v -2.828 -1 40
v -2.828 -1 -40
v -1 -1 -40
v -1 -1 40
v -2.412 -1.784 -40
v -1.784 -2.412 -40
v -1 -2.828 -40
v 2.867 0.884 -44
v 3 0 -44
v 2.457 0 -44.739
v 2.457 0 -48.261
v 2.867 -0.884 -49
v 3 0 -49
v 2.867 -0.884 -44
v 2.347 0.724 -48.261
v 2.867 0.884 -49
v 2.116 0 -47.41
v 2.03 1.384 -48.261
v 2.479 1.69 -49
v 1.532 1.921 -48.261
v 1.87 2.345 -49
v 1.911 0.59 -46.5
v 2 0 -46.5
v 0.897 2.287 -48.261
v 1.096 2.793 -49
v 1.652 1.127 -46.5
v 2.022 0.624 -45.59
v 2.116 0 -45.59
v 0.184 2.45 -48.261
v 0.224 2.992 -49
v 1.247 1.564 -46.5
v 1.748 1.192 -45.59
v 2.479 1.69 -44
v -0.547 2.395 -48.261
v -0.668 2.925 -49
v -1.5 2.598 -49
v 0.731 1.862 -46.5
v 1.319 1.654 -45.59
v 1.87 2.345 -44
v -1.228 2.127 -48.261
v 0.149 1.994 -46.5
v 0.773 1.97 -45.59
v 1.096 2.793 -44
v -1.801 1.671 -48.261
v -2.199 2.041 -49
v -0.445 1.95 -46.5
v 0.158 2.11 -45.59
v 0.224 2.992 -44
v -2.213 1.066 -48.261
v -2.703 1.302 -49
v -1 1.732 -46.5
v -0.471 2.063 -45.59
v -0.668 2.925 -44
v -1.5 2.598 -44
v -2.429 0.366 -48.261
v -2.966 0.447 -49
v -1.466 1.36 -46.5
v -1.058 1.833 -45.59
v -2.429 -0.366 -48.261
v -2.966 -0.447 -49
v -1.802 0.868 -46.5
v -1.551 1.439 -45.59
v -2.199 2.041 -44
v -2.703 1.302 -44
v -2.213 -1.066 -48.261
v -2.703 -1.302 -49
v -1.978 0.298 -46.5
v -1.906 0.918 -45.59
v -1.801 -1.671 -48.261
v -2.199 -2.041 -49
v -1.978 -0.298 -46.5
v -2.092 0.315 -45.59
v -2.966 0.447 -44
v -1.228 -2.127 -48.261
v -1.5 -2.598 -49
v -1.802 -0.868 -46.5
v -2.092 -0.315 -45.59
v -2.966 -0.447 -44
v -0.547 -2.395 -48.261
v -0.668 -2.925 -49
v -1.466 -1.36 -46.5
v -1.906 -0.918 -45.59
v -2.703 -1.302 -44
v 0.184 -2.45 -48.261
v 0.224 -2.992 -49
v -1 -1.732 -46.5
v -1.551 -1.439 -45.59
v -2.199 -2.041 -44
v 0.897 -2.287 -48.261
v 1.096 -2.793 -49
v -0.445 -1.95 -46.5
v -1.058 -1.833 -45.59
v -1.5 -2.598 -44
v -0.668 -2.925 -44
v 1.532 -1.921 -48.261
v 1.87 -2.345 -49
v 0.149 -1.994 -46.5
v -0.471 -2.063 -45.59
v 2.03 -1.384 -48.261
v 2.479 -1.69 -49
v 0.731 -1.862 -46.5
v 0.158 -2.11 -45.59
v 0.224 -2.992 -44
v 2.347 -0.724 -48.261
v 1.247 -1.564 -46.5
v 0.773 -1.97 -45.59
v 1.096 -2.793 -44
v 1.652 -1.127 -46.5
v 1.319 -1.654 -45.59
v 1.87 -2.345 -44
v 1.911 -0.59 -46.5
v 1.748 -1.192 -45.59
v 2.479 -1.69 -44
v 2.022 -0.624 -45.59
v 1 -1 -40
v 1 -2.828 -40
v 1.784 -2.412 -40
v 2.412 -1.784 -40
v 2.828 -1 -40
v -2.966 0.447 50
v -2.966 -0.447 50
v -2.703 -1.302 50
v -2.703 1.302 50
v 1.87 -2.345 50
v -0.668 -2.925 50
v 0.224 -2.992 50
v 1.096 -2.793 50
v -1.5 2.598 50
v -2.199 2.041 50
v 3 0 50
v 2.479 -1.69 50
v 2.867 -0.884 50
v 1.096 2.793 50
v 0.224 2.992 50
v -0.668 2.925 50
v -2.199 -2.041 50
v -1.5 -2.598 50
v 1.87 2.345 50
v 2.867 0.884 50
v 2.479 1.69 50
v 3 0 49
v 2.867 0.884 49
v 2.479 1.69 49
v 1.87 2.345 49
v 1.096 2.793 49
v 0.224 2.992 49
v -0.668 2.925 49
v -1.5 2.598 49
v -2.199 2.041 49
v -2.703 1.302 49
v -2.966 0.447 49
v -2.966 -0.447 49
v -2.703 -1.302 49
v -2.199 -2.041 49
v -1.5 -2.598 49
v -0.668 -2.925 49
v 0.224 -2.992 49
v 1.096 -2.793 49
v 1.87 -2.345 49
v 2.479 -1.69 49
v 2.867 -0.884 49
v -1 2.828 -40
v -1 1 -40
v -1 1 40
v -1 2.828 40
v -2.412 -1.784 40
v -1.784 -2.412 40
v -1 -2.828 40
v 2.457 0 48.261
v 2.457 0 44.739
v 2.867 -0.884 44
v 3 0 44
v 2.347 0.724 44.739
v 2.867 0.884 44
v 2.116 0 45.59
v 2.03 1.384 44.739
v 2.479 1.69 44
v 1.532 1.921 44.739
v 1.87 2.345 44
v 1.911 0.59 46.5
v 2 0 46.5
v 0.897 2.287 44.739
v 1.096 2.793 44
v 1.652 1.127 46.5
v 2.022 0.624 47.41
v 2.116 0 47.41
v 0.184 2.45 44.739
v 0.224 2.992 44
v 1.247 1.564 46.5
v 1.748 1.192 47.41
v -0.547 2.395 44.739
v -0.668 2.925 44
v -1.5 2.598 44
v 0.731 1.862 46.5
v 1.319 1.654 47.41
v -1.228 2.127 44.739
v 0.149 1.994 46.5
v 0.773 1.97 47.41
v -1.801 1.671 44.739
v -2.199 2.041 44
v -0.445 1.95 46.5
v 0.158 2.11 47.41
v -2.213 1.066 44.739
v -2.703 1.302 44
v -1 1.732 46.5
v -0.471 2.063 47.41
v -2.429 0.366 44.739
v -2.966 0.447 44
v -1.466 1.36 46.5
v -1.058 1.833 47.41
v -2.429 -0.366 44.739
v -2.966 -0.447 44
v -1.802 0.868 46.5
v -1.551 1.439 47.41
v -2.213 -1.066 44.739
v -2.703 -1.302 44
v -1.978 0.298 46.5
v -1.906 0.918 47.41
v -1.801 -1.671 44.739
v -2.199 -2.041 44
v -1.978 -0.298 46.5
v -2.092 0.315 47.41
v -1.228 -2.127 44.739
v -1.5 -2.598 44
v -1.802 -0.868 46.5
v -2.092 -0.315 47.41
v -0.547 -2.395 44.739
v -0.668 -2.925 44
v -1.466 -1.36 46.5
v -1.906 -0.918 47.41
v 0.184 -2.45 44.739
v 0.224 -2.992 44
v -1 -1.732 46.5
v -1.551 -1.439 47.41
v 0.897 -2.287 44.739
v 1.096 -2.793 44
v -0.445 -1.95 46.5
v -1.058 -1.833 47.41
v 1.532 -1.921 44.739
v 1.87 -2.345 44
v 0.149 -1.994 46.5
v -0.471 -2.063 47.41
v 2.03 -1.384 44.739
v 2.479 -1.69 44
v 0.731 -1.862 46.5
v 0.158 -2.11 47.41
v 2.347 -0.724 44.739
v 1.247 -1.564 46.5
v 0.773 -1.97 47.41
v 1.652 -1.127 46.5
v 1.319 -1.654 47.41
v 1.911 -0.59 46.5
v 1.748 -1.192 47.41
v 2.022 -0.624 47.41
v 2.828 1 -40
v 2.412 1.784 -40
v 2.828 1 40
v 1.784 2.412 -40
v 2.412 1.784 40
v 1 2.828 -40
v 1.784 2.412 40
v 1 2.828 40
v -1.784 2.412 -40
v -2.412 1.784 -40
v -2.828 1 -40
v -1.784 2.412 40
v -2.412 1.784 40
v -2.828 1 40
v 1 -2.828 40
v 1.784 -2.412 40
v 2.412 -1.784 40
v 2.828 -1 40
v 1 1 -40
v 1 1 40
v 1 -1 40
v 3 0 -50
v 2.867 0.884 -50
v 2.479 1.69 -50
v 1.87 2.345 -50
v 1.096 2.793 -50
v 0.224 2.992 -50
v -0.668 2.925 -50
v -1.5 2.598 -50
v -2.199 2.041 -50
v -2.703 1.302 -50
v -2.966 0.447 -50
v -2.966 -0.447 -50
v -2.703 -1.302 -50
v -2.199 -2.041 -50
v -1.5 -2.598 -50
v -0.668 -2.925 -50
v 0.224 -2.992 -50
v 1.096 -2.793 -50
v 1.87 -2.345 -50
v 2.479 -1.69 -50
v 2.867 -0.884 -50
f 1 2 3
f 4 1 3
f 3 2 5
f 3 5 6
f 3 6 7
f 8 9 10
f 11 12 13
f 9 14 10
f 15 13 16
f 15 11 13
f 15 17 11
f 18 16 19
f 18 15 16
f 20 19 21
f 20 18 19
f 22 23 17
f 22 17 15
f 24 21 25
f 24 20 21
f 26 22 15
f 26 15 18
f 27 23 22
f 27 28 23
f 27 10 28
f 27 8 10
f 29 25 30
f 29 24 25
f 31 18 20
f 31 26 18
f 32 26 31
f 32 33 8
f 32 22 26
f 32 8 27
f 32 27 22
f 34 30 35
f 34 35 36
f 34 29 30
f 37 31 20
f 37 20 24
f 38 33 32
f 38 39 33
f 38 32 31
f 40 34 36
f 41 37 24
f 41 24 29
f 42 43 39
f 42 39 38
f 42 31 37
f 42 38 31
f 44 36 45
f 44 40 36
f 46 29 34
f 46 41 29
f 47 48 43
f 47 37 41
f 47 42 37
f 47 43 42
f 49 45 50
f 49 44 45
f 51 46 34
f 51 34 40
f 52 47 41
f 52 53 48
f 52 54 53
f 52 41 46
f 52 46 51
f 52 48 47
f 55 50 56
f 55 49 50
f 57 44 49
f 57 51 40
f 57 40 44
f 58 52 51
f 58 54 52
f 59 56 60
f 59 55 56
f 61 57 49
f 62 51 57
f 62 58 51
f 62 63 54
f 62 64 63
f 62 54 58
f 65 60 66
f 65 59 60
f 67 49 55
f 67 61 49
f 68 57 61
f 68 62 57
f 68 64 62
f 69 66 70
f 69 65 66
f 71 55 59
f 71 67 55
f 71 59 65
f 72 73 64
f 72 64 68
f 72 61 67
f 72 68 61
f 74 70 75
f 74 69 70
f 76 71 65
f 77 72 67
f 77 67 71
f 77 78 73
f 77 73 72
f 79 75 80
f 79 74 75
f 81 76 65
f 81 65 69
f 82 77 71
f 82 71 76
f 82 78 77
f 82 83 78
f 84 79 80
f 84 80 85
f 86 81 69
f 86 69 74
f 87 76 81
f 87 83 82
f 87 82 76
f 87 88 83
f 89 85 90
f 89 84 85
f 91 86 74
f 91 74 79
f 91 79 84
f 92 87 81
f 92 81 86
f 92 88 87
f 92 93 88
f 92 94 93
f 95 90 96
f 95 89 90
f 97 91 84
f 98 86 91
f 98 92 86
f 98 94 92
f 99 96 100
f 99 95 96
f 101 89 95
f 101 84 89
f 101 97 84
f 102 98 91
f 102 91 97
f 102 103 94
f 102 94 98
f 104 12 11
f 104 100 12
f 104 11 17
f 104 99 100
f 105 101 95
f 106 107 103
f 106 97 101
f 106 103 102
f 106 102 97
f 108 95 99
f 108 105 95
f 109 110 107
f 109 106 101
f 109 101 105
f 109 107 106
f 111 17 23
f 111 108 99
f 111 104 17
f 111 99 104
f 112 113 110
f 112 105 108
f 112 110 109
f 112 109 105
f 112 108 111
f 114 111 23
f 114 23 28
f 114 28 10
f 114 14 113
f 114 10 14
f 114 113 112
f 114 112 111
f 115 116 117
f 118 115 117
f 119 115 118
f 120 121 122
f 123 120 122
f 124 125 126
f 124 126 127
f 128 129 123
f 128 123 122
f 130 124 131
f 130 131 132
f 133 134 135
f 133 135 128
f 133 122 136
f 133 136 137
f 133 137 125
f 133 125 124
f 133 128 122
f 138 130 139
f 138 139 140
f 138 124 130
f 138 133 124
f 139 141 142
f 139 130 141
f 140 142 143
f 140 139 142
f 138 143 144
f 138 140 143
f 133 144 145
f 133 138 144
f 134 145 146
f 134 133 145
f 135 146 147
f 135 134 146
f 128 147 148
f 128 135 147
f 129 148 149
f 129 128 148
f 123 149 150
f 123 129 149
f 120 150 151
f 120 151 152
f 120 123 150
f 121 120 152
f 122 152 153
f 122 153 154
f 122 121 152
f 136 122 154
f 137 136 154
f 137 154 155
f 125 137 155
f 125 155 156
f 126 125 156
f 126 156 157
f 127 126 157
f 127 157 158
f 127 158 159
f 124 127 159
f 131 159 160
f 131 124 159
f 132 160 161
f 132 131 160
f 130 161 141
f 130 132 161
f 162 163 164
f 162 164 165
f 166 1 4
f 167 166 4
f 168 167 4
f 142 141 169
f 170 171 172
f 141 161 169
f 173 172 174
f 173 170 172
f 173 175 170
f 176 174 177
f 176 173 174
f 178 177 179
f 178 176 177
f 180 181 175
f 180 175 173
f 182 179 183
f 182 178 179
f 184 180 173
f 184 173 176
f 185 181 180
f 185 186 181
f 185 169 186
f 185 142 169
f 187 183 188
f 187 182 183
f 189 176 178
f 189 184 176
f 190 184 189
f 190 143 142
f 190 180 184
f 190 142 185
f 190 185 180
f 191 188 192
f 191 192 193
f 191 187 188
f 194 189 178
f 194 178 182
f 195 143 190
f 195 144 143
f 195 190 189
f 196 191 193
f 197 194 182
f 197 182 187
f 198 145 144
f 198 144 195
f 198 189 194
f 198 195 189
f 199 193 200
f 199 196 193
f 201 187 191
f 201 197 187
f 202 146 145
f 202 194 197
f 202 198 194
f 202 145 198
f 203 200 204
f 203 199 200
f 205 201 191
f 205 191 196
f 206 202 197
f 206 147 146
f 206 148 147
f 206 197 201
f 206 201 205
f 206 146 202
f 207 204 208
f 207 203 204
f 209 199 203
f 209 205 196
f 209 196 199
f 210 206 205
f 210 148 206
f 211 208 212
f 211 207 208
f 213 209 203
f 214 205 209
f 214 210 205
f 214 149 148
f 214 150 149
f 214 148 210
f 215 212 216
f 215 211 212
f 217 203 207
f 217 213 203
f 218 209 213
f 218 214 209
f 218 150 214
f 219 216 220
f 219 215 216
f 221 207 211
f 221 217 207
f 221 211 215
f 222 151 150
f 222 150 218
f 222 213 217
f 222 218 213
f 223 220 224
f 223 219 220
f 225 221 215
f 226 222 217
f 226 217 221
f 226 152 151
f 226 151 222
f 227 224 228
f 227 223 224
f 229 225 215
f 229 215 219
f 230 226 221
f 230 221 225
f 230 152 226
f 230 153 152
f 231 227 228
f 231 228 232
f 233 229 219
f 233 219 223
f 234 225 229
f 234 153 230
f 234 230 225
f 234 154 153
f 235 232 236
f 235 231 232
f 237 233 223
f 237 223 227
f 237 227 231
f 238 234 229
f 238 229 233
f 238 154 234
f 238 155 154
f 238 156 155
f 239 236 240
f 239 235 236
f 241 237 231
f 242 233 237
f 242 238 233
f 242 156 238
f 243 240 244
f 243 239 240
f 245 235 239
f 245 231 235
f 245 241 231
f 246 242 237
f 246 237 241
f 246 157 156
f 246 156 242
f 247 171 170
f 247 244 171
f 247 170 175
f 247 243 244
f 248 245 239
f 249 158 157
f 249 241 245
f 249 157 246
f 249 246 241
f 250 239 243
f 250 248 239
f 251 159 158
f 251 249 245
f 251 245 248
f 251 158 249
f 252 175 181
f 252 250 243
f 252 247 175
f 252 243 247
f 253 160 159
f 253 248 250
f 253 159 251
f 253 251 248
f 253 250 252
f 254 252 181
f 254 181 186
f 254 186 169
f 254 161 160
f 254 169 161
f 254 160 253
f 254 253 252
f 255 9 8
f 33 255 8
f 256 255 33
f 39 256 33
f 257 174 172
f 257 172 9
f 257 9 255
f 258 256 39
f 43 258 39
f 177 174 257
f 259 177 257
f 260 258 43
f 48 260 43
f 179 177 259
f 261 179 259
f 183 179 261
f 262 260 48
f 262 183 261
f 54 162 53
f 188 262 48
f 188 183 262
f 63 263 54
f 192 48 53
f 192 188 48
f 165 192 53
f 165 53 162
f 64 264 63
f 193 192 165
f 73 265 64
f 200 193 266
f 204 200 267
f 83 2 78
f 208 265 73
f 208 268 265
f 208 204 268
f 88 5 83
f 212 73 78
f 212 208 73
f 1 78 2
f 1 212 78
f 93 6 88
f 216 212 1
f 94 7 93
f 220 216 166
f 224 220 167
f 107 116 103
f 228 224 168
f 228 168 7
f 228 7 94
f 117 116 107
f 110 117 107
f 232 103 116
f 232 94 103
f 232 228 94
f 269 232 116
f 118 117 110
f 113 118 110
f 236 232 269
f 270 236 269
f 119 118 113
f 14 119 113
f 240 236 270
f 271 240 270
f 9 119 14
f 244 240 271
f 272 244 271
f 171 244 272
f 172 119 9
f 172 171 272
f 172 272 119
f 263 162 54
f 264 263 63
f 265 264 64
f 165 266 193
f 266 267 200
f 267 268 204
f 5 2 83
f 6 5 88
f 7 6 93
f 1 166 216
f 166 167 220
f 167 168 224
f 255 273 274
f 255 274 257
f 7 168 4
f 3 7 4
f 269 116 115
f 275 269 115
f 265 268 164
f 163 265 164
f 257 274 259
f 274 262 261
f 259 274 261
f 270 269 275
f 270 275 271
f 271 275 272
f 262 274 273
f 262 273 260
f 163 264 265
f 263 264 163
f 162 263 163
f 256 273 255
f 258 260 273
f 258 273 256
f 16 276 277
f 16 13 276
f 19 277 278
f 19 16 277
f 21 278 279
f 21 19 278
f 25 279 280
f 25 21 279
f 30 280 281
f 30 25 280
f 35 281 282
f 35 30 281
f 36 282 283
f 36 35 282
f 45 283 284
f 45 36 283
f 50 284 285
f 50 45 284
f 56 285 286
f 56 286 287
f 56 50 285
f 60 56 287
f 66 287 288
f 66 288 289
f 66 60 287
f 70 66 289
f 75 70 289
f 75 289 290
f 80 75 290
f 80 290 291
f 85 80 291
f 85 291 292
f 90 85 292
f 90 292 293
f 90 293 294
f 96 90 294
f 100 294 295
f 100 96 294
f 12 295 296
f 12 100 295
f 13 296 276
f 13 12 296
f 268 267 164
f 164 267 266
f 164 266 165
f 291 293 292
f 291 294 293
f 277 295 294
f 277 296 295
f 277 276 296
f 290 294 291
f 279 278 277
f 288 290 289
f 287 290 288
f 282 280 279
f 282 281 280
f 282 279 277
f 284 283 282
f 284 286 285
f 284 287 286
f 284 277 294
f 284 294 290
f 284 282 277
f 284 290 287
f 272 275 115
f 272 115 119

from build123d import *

# Parameters (mm, degrees)
F2_W          = 2
F2_H          = 2
F3_DEPTH      = 40
F3_DEPTH_BACK = 40


# Not quite as in the source:
# - a feature names something its author has since deleted; it is built from what else it names


with BuildPart() as f1:
    # F0 (on Front) → F1 (revolve)
    with BuildSketch(Plane.XZ):
        with BuildLine():
            Line((0, 50), (0, -50))
            Line((0, -50), (3, -50))
            Line((3, -50), (3, -49))
            ThreePointArc((3, -49), (2, -46.5), (3, -44))
            Line((3, -44), (3, 0))
            Line((3, 0), (3, 44))
            ThreePointArc((3, 44), (2, 46.5), (3, 49))
            Line((3, 49), (3, 50))
            Line((3, 50), (0, 50))
        make_face()
    revolve(axis=Axis((0, 0, 0), (0, 0, 1)))

    # F2 (on Top) → F3 (cut, two sides)
    with BuildSketch(Plane.XY) as f3_sk:
        with Locations((2, 2)):
            Rectangle(F2_W, F2_H)
        with Locations((-2, 2)):
            Rectangle(F2_W, F2_H)
        with Locations((-2, -2)):
            Rectangle(F2_W, F2_H)
        with Locations((2, -2)):
            Rectangle(F2_W, F2_H)
    extrude(amount=-F3_DEPTH, mode=Mode.SUBTRACT)
    extrude(f3_sk.sketch, amount=F3_DEPTH_BACK, mode=Mode.SUBTRACT)


solid = f1.part
